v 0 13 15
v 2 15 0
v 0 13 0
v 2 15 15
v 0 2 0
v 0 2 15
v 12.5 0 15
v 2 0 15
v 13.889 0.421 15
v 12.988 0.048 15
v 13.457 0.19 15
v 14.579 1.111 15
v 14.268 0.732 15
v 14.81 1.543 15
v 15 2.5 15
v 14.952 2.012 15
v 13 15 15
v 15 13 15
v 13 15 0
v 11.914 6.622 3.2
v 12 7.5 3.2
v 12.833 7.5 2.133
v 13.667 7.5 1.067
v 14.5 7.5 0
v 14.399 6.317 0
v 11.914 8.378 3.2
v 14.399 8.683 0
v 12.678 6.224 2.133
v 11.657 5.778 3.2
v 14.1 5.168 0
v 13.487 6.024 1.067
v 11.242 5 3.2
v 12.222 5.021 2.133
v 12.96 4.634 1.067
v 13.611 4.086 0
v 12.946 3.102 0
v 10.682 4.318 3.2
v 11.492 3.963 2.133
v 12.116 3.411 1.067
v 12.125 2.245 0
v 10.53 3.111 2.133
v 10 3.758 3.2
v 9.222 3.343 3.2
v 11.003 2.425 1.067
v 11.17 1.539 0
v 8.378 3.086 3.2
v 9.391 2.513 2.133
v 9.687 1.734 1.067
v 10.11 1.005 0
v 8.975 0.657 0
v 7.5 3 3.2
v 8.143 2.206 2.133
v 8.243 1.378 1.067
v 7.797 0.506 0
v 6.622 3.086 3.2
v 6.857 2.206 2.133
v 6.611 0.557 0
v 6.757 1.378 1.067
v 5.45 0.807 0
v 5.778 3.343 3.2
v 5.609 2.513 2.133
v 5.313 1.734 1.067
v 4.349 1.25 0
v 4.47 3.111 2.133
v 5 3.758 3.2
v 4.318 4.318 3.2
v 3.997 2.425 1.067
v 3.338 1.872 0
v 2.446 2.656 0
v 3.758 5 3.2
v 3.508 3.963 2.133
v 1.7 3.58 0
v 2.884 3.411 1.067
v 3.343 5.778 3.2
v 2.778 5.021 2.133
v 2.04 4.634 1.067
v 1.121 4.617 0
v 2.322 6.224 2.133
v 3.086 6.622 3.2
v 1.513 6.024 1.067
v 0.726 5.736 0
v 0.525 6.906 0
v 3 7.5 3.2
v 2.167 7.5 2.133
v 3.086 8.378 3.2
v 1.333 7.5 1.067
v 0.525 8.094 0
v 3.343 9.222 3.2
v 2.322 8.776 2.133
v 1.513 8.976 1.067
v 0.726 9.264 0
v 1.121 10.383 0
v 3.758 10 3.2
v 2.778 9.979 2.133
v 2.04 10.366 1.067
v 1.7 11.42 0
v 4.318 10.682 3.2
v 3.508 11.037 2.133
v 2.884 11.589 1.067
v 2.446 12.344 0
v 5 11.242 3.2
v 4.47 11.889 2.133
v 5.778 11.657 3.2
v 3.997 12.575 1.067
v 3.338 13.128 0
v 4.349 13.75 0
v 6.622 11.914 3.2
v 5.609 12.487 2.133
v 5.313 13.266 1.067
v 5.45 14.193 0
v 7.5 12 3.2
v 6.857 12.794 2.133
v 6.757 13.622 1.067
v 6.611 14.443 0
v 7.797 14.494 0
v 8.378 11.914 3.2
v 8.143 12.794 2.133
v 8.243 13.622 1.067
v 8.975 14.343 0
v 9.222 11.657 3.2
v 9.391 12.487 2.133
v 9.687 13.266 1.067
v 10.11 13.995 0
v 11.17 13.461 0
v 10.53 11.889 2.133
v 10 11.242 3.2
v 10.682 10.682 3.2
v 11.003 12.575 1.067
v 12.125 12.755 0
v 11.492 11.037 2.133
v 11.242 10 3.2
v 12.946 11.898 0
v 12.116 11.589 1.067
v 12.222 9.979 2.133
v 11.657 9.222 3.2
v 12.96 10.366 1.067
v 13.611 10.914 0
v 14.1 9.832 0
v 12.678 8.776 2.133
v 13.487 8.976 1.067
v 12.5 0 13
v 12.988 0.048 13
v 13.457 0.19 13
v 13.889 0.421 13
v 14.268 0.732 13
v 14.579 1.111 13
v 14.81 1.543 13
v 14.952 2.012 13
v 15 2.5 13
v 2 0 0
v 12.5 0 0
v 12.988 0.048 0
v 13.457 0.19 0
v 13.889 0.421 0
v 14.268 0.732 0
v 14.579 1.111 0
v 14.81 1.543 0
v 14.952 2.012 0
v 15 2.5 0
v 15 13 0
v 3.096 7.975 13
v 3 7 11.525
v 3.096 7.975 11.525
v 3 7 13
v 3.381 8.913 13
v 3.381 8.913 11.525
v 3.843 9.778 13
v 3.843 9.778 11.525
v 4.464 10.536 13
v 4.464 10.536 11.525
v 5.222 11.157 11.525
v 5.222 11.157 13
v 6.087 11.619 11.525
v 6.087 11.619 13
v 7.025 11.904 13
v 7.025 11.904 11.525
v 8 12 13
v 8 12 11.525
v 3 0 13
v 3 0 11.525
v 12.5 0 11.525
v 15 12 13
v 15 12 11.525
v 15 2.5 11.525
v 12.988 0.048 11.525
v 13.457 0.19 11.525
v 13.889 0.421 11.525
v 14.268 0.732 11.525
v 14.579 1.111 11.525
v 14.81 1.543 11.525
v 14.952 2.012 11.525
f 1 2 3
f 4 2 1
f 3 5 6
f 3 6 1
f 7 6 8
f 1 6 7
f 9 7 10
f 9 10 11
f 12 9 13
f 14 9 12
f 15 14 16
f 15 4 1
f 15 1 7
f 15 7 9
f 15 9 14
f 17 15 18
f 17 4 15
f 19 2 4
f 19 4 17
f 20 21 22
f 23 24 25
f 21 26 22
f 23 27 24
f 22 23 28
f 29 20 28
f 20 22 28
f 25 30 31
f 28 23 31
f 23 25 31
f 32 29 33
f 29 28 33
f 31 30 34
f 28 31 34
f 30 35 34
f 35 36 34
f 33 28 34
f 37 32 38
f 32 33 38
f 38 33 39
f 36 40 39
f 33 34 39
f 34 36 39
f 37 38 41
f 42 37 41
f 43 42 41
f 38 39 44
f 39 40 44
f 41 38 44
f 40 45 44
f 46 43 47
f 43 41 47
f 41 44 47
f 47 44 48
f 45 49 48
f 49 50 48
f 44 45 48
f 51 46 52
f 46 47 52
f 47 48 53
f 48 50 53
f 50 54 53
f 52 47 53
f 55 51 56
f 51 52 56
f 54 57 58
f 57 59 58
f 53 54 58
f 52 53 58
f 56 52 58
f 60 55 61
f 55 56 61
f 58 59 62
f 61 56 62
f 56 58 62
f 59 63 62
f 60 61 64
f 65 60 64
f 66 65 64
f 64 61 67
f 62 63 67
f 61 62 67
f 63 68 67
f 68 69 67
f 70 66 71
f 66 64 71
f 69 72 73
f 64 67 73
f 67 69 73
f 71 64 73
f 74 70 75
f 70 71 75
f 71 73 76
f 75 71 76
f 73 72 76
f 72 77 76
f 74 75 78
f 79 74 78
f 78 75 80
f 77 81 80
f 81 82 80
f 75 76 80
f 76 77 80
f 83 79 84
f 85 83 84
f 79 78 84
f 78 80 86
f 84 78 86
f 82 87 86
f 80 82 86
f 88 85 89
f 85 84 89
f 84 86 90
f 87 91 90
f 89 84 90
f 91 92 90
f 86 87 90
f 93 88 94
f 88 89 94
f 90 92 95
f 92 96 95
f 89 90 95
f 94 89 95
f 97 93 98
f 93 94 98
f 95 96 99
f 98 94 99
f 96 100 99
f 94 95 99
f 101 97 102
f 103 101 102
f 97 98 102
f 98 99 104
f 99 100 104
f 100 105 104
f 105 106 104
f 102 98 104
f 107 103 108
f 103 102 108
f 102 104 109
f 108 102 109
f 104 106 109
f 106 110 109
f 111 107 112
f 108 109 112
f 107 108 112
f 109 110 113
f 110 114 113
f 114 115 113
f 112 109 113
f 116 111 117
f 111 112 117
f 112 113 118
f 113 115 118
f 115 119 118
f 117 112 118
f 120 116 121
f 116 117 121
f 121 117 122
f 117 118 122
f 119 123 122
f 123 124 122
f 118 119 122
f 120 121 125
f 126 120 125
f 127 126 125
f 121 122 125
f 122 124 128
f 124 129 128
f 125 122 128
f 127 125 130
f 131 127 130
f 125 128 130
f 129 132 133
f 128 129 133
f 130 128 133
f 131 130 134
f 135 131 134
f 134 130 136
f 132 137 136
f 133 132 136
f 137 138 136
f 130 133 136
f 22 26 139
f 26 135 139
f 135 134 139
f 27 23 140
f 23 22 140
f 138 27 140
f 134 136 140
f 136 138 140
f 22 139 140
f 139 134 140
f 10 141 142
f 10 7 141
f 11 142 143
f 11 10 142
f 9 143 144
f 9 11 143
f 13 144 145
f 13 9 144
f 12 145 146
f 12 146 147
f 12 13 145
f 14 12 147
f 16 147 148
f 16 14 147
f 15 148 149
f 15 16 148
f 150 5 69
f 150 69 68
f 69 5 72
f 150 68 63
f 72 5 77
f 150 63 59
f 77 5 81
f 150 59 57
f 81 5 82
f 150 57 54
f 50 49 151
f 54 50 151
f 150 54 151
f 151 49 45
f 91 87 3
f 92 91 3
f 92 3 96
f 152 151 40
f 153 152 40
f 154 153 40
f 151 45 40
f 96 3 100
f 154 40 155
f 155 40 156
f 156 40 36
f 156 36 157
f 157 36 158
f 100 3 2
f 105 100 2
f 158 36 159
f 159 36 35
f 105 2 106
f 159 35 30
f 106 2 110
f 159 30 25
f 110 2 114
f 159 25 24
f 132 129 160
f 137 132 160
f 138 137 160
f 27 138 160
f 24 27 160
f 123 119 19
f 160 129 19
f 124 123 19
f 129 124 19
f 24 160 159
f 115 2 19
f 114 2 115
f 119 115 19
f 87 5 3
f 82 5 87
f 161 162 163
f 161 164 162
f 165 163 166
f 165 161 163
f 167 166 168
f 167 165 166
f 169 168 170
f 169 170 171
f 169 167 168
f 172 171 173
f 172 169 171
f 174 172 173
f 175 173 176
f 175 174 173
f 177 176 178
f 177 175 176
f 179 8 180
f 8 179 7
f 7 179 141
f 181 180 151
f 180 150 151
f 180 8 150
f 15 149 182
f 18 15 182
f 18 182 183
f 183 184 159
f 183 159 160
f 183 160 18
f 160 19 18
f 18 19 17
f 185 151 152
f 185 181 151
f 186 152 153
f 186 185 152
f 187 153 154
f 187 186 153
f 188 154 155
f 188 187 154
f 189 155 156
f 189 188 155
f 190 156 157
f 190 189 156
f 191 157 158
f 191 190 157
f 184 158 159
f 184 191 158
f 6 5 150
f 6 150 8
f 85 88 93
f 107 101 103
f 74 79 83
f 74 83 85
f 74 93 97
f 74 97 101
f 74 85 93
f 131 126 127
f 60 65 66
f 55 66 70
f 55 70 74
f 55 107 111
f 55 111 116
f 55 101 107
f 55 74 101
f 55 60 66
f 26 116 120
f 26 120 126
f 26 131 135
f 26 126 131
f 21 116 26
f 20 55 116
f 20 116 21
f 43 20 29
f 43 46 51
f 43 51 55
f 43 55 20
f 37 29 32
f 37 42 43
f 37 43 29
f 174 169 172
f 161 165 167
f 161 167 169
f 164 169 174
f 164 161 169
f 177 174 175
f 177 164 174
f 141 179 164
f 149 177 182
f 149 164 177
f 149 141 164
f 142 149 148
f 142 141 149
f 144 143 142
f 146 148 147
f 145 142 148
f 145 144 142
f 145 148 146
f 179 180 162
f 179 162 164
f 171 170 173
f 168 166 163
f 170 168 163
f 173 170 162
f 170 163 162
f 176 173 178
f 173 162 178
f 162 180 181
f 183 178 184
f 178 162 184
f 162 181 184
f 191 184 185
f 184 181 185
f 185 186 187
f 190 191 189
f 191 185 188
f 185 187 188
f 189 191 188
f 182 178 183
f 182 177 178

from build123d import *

# Parameters (mm, degrees)
F0_W     = 15
F0_H     = 15
F1_DEPTH = 15
F2_W     = 12
F2_H     = 1.475
F3_DEPTH = 12
F4_R     = 5
F5_R     = 7
F6_DEPTH = 3.2
F7_SIZE2 = 3.19999
F7_SIZE  = 2.49999
F8_R     = 2.5
F9_SIZE  = 2


# Not quite as in the source:
# - a fillet or chamfer is up to 0.001 mm smaller than in the source, because OpenCascade refuses the exact size


with BuildPart() as f1:
    # F0 (on Top) → F1 (new body)
    with BuildSketch(Plane.XY):
        with Locations((7.5, 7.5)):
            Rectangle(F0_W, F0_H)
    extrude(amount=F1_DEPTH)

    # F2 (on face) → F3 (cut)
    with BuildSketch(Plane.XZ):
        with Locations((9, 12.2625)):
            Rectangle(F2_W, F2_H)
    extrude(amount=-F3_DEPTH, mode=Mode.SUBTRACT)

    # F4
    f4_edges = [f1.edges().sort_by_distance(p)[0] for p in [
        (3, 12, 12.2625),
    ]]
    fillet(f4_edges, radius=F4_R)

    # F5 (on face) → F6 (cut)
    with BuildSketch(Plane(origin=(0, 0, 0), x_dir=(1, 0, 0), z_dir=(0, 0, -1))):
        with Locations((7.5, -7.5)):
            Circle(F5_R)
    extrude(amount=-F6_DEPTH, mode=Mode.SUBTRACT)

    # F7 (size 2.5 and 3.2 in the source; OpenCascade refuses exactly that, so slightly less here)
    f7_edges = [f1.edges().sort_by_distance(p)[0] for p in [
        (0.5, 7.5, 3.2),
    ]]
    f7_side = f1.faces().sort_by_distance((7.5, 7.5, 3.2))[0]
    chamfer(f7_edges, length=F7_SIZE, length2=F7_SIZE2, reference=f7_side)

    # F8
    f8_edges = [f1.edges().sort_by_distance(p)[0] for p in [
        (15, 0, 14),
        (15, 0, 5.7625),
    ]]
    fillet(f8_edges, radius=F8_R)

    # F9
    f9_edges = [f1.edges().sort_by_distance(p)[0] for p in [
        (15, 15, 7.5),
        (0, 15, 7.5),
        (0, 0, 7.5),
    ]]
    chamfer(f9_edges, length=F9_SIZE)


solid = f1.part
